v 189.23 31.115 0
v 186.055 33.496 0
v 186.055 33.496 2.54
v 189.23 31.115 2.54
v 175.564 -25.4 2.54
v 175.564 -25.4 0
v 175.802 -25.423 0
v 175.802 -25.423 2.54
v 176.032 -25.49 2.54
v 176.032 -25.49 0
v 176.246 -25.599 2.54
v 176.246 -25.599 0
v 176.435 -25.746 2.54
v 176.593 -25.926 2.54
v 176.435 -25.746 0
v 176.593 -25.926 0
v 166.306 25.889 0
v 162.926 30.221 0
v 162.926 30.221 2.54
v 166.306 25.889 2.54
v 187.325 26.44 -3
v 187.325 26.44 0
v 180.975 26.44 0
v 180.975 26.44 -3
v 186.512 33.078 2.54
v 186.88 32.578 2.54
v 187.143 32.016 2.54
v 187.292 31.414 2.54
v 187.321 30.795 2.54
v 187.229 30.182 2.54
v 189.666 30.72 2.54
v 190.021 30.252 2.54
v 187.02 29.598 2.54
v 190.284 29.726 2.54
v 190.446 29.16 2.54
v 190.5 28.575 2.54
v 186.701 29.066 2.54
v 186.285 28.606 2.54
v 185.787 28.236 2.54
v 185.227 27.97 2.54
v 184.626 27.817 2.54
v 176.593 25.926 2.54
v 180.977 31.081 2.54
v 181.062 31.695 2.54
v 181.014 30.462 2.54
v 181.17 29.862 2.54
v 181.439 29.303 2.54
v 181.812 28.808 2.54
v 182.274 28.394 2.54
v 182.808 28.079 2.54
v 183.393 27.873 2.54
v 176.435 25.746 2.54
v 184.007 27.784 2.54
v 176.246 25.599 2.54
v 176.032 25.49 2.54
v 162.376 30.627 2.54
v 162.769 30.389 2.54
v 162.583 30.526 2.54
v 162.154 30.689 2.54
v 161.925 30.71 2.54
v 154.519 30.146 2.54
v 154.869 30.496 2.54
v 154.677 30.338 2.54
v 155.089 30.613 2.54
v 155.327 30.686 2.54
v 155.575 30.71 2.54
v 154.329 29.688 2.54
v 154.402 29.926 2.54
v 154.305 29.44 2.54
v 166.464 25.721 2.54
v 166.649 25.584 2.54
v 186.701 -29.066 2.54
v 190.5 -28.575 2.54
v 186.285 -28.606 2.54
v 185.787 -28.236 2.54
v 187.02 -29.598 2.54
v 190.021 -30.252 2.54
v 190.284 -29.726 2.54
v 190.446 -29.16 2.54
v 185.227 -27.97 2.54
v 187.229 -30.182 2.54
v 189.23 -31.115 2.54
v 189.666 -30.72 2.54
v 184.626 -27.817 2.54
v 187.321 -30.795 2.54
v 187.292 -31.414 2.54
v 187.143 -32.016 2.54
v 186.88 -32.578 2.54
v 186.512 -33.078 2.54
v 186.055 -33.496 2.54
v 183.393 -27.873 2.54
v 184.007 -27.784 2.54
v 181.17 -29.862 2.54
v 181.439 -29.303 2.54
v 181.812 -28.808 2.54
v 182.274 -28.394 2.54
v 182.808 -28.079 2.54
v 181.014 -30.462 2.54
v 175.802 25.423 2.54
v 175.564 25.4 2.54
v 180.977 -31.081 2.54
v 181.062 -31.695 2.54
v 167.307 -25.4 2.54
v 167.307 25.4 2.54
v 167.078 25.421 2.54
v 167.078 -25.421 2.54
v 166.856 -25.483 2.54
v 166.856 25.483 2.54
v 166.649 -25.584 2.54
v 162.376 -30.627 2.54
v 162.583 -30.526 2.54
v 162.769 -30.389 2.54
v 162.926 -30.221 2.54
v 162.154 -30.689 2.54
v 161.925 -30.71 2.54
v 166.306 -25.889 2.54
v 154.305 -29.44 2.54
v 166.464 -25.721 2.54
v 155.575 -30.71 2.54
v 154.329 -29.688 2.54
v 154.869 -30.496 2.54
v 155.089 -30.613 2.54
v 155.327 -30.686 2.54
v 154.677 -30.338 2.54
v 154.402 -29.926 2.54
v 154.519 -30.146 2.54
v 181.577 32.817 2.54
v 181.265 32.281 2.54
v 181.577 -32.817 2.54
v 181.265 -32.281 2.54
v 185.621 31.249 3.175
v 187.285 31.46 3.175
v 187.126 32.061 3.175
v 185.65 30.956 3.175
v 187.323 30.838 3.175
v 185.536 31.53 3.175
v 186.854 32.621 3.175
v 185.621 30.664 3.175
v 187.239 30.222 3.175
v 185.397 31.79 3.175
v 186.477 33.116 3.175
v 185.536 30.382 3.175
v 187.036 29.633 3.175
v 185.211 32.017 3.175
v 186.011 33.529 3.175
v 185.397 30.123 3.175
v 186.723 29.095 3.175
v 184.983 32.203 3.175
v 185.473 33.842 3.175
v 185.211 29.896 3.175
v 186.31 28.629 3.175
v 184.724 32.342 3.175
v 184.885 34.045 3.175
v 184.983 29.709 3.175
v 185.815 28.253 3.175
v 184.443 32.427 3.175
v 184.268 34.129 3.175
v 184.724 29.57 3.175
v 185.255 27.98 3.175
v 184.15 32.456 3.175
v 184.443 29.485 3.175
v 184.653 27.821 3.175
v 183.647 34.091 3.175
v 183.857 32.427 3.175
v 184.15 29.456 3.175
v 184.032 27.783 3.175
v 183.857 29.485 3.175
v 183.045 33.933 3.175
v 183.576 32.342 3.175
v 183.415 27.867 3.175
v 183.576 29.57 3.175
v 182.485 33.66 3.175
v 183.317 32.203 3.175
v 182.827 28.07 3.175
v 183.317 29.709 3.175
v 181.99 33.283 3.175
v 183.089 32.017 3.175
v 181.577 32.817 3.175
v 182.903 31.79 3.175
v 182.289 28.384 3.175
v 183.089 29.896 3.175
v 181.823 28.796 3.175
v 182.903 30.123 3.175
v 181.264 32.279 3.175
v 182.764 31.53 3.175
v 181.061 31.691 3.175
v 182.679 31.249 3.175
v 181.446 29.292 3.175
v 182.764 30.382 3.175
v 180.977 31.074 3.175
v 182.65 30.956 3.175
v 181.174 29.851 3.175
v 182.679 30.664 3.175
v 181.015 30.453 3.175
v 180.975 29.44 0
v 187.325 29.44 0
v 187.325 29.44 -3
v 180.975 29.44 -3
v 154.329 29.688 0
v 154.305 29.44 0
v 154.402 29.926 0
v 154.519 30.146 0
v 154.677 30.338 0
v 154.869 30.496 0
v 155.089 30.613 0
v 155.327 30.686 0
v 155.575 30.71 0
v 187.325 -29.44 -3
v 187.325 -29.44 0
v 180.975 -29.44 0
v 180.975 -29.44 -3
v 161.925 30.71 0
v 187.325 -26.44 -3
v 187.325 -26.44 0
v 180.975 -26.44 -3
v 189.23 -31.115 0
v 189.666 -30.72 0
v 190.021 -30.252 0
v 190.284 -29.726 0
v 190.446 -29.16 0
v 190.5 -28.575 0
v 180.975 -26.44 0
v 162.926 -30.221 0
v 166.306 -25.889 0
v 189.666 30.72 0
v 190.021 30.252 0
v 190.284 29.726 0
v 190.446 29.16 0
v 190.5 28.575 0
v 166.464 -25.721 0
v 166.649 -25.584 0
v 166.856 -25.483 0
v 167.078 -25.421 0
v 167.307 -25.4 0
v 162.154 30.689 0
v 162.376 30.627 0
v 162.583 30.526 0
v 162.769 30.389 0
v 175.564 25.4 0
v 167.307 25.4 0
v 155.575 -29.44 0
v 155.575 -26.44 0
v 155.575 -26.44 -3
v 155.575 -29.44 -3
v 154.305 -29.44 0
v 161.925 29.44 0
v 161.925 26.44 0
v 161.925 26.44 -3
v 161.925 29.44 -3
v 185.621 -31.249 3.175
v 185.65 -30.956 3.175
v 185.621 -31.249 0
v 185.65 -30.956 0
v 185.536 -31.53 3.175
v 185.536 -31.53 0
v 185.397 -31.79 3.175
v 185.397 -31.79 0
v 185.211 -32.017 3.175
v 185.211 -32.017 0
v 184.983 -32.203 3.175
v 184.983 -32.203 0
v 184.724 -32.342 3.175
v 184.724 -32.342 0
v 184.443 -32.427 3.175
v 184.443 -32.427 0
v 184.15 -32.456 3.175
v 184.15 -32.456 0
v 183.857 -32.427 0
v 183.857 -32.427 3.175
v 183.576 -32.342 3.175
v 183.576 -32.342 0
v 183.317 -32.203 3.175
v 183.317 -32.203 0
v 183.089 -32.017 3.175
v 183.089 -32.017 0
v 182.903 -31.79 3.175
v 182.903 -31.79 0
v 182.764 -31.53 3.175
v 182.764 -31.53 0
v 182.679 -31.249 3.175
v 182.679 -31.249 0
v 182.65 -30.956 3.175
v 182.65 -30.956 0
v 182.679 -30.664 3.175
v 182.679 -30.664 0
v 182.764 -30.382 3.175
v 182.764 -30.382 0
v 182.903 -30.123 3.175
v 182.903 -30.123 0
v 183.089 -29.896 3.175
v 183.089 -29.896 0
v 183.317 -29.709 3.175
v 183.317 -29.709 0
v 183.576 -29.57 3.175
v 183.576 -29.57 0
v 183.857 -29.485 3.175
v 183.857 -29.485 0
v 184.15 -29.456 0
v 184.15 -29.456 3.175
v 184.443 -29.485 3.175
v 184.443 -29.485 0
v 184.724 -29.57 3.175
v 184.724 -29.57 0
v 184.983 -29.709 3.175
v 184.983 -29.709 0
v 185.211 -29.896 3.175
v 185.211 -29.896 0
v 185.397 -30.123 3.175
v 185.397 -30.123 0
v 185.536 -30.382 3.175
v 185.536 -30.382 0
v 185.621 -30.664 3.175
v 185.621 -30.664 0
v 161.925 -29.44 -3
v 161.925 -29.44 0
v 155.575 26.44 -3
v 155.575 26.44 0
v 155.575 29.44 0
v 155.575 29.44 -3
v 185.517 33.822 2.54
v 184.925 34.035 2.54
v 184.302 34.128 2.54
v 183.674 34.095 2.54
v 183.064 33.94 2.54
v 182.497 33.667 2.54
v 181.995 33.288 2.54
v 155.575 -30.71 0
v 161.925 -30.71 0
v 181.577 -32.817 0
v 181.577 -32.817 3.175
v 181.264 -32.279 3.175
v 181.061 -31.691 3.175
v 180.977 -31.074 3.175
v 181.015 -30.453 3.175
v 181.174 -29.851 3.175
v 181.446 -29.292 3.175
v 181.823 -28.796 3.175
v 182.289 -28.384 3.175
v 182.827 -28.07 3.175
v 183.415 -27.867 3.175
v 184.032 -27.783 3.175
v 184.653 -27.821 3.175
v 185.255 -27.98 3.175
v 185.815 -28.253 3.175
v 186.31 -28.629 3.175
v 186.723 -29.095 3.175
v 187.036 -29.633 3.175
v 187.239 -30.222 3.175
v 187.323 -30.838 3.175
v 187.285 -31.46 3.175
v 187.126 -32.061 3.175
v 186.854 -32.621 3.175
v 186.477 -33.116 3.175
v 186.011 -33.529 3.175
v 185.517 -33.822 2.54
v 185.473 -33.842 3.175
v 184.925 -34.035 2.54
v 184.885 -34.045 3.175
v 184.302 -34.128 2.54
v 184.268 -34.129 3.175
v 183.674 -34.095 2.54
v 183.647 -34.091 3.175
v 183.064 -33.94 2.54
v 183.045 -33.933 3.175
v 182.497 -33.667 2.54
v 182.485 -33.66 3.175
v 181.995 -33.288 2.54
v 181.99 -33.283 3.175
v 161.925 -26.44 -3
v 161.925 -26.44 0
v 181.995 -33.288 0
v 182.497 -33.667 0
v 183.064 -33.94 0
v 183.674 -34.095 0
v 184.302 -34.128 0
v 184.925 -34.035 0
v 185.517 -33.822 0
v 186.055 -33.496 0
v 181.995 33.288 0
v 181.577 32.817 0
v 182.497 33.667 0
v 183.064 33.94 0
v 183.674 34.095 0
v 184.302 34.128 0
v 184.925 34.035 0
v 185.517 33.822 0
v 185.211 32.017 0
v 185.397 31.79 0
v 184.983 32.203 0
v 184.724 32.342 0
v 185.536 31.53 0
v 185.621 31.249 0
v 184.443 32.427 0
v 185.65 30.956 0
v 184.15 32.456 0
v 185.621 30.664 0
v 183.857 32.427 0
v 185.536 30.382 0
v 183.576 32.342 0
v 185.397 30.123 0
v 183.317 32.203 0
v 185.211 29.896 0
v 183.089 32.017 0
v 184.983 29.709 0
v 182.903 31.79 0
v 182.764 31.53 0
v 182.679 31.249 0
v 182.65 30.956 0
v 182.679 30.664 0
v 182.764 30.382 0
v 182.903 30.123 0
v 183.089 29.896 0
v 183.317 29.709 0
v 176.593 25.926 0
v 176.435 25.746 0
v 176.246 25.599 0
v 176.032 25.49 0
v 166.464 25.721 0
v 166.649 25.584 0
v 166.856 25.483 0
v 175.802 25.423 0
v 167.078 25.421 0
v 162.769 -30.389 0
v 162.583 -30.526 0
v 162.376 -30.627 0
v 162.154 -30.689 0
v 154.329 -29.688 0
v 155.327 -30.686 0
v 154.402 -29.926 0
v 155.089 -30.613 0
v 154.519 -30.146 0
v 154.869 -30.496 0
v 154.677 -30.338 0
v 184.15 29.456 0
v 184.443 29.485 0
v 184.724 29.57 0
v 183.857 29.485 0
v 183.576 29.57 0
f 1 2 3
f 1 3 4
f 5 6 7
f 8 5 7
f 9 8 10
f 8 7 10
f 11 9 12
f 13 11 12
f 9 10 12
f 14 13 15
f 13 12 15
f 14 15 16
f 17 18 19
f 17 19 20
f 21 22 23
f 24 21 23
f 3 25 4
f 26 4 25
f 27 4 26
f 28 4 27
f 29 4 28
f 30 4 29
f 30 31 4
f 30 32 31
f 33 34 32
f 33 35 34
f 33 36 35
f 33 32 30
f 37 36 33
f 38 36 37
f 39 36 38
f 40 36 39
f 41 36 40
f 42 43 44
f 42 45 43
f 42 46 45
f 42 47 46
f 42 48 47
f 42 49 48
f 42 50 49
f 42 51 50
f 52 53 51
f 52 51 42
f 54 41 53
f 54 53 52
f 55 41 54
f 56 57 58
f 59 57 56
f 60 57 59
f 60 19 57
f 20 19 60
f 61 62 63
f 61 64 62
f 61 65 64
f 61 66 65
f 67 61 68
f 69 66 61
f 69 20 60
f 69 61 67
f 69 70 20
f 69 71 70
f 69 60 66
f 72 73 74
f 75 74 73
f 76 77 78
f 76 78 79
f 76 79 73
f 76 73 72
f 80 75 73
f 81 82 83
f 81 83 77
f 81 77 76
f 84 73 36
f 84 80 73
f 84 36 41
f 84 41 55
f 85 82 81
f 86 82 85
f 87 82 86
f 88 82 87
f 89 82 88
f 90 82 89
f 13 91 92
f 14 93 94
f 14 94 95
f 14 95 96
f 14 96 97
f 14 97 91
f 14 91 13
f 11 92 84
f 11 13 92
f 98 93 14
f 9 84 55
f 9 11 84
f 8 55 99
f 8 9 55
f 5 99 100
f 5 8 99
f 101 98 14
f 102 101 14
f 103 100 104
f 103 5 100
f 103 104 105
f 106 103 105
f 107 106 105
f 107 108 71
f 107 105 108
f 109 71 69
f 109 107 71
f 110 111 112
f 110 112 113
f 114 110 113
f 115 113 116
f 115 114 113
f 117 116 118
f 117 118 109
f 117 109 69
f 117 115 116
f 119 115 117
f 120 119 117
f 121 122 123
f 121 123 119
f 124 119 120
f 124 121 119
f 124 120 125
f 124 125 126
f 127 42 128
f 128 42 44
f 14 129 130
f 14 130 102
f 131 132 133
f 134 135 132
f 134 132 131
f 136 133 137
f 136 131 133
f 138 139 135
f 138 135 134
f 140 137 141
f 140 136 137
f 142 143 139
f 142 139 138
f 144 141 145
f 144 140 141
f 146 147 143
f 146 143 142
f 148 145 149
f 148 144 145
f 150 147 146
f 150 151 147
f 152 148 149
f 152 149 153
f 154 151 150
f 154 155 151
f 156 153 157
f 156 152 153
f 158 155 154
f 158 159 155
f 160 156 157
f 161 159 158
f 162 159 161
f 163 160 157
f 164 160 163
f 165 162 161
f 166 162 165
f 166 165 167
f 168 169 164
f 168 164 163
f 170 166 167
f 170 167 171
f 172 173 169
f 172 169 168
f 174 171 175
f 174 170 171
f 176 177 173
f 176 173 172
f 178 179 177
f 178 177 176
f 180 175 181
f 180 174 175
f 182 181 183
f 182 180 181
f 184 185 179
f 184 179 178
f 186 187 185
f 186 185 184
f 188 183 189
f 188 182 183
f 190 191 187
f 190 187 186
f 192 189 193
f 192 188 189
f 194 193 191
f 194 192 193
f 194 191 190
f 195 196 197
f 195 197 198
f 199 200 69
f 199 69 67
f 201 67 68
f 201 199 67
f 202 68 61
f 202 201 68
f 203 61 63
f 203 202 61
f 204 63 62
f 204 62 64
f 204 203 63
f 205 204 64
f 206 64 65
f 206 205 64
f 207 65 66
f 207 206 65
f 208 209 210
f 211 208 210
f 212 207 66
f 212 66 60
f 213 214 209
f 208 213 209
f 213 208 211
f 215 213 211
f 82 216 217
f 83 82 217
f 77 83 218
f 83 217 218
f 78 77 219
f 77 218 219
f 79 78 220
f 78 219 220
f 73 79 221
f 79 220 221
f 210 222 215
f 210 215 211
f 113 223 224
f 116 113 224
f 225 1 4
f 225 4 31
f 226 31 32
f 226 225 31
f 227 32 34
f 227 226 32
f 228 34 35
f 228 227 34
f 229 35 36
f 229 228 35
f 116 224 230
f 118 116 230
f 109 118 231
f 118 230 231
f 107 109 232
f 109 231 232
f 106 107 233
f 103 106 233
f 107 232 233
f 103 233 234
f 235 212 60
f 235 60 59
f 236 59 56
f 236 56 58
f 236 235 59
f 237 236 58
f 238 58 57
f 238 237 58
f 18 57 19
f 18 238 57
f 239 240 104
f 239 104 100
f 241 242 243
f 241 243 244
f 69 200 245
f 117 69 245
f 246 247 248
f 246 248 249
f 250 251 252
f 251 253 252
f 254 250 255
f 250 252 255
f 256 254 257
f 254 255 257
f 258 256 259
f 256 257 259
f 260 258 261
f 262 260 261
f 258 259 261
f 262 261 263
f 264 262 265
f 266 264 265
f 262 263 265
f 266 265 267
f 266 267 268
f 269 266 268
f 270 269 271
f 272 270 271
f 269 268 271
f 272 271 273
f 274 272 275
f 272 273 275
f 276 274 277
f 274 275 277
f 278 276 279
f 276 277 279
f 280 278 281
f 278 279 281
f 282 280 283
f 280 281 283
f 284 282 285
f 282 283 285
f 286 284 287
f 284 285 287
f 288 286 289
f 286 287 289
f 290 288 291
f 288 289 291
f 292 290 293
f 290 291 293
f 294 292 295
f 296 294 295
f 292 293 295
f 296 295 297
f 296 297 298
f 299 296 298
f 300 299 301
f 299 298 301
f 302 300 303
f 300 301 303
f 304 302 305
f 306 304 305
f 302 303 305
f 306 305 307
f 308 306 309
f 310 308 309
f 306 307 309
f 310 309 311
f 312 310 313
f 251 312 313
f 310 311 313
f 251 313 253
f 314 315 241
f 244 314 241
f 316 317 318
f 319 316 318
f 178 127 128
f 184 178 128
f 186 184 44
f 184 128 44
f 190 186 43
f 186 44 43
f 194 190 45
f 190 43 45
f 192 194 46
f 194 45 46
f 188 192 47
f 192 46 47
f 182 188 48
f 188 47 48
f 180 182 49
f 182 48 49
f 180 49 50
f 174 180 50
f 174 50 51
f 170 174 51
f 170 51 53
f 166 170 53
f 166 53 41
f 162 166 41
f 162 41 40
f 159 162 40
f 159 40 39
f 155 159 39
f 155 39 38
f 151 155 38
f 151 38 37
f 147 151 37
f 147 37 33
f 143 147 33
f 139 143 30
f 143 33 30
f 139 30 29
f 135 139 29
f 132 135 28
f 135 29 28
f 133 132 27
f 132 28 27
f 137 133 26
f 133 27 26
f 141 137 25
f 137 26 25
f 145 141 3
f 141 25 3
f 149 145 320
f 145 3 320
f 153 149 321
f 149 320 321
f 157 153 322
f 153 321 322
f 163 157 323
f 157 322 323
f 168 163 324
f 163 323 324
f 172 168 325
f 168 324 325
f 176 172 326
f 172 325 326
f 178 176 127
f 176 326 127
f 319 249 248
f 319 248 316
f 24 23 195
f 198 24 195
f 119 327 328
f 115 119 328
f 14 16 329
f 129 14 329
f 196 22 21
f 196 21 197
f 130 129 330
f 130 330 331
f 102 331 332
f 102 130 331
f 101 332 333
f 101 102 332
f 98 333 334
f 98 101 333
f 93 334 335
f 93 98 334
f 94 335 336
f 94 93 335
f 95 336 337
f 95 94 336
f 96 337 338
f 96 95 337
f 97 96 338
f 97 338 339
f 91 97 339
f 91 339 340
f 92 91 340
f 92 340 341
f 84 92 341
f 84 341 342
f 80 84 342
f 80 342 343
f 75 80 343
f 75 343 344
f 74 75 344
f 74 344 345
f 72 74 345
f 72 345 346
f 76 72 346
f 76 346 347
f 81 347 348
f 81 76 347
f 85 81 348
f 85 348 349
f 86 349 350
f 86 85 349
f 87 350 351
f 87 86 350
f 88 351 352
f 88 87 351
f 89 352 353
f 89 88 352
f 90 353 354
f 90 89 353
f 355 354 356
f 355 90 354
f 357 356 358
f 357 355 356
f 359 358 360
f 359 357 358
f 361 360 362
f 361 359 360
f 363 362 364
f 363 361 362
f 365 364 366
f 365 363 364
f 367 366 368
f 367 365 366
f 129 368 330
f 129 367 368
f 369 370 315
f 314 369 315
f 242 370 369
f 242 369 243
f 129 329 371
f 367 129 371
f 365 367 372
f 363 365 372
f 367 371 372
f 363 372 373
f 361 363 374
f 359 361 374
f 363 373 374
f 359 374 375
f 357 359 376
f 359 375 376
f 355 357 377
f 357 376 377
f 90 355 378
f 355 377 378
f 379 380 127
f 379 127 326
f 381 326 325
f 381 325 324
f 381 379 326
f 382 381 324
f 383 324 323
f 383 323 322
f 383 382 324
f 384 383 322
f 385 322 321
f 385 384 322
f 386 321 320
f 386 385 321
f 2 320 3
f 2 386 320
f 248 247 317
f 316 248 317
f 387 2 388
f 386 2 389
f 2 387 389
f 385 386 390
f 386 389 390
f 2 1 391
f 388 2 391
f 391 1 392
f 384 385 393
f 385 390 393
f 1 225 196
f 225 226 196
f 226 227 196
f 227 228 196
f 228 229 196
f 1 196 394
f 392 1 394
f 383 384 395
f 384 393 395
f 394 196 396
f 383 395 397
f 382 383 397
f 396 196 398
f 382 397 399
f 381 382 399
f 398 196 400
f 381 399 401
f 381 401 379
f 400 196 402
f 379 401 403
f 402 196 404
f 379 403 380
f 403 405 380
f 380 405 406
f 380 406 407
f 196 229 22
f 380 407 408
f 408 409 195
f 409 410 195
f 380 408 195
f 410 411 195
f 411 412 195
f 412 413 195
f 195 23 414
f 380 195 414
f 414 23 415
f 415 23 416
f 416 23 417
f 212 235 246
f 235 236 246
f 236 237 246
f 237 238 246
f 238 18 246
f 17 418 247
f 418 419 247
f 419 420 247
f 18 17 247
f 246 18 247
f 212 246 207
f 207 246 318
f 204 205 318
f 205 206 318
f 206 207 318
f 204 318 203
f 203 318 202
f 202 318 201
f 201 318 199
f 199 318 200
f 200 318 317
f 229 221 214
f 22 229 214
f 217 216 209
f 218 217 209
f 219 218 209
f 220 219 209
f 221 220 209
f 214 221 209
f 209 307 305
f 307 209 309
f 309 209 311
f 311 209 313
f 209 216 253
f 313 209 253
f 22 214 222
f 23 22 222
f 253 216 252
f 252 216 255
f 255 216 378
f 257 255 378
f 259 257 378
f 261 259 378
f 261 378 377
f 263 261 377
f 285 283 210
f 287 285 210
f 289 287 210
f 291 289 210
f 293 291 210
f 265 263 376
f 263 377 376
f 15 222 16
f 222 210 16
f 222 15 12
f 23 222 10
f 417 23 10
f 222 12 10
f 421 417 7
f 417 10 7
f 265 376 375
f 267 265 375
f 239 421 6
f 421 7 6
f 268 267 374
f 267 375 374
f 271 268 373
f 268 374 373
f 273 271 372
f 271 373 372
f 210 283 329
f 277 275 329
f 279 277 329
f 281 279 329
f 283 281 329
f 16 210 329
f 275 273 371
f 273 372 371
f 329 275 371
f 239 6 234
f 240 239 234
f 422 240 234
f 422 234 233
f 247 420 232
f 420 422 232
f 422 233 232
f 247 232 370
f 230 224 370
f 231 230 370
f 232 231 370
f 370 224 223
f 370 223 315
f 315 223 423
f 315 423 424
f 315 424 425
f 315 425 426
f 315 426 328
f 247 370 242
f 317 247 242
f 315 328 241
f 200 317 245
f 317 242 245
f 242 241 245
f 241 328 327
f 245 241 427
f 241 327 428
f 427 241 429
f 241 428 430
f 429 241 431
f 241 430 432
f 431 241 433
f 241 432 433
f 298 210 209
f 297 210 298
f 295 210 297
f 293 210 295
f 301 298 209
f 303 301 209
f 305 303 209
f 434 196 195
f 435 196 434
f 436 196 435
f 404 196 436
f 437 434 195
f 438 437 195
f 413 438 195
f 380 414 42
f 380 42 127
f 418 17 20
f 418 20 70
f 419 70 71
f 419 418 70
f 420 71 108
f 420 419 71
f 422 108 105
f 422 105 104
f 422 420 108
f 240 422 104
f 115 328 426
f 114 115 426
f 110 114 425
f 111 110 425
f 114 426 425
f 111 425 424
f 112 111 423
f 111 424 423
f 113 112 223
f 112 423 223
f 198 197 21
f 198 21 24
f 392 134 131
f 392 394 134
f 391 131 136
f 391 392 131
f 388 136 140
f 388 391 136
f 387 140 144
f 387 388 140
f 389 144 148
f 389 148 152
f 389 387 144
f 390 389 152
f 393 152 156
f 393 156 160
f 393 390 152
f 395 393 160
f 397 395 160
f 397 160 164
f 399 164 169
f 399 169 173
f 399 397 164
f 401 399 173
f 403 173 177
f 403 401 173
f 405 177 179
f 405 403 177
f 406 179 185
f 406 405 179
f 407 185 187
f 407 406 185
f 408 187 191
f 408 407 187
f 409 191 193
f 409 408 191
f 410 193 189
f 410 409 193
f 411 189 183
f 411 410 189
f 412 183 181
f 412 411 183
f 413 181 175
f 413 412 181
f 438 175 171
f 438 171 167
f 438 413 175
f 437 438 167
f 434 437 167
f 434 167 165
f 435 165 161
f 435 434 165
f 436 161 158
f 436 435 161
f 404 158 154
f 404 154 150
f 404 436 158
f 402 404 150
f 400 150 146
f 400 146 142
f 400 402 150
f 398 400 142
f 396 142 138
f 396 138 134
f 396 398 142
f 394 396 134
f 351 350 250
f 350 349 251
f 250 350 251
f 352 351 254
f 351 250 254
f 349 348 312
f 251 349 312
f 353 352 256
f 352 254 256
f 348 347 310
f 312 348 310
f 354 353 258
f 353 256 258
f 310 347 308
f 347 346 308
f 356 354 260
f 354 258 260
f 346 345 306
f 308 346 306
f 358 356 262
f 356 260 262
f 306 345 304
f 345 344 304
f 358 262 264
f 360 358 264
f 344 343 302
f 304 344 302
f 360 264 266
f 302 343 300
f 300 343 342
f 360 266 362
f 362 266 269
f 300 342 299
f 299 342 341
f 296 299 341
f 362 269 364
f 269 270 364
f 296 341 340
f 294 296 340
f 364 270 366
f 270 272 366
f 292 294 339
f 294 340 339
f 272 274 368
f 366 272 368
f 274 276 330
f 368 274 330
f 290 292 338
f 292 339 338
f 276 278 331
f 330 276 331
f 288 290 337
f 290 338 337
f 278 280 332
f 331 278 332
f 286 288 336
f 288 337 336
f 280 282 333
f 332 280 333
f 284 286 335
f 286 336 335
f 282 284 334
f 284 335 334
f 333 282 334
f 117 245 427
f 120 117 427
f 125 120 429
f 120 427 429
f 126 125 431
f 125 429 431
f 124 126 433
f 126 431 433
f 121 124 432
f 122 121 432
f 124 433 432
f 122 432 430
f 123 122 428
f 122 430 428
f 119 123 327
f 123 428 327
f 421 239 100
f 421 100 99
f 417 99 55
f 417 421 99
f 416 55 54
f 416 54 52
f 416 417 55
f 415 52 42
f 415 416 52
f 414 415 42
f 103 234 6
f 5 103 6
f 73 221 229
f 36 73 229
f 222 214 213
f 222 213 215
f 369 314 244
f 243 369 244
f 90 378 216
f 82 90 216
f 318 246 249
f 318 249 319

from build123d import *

# Parameters (mm, degrees)
SKETCH2_R           = 1.5
BOSS_EXTRUDE1_DEPTH = 2.54
SKETCH3_R           = 3.175
SKETCH3_R_2         = 1.5
BOSS_EXTRUDE2_DEPTH = 0.635
SKETCH4_W           = 6.35
SKETCH4_H           = 3
BOSS_EXTRUDE3_DEPTH = 3


with BuildPart() as part:
    # Sketch2 → Boss-Extrude1 (new body)
    with BuildSketch(Plane.XY):
        with BuildLine():
            Line((186.055, 33.49625), (189.23, 31.115))
            ThreePointArc((189.23, 31.115), (190.164806331, 29.994903166), (190.5, 28.575))
            Line((190.5, 28.575), (190.5, 0))
            Line((190.5, 0), (154.305, 0))
            Line((154.305, 0), (154.305, 29.44))
            ThreePointArc((154.305, 29.44), (154.676974388, 30.338025612), (155.575, 30.71))
            Line((155.575, 30.71), (161.925, 30.71))
            ThreePointArc((161.925, 30.71), (162.482139282, 30.58126939), (162.926332297, 30.221174521))
            Line((162.926332297, 30.221174521), (166.306150062, 25.888825479))
            ThreePointArc((166.306150062, 25.888825479), (166.750343077, 25.52873061), (167.307482358, 25.4))
            Line((167.307482358, 25.4), (175.563715168, 25.4))
            ThreePointArc((175.563715168, 25.4), (176.141475824, 25.539030228), (176.592738534, 25.925680906))
            Line((176.592738534, 25.925680906), (181.577441586, 32.817047734))
            ThreePointArc((181.577441586, 32.817047734), (183.673830399, 34.095340236), (186.055, 33.49625))
        make_face()
        with Locations((184.15, 30.95625)):
            Circle(SKETCH2_R, mode=Mode.SUBTRACT)
    extrude(amount=BOSS_EXTRUDE1_DEPTH)

    # Sketch3 → Boss-Extrude2 (add)
    with BuildSketch(Plane.XY.offset(2.54)):
        with Locations(Location((184.15, 30.95625, 0), (0, 0, 144.120815799))):
            Circle(SKETCH3_R)
        with Locations((184.15, 30.95625)):
            Circle(SKETCH3_R_2, mode=Mode.SUBTRACT)
    extrude(amount=BOSS_EXTRUDE2_DEPTH)

    # Sketch4 → Boss-Extrude3 (add)
    with BuildSketch(Plane(origin=(0, 0, 0), x_dir=(-1, 0, 0), z_dir=(0, 0, -1))):
        with Locations((-184.15, 27.94)):
            Rectangle(SKETCH4_W, SKETCH4_H)
        with Locations((-158.75, 27.94)):
            Rectangle(SKETCH4_W, SKETCH4_H)
    extrude(amount=BOSS_EXTRUDE3_DEPTH)

    # Mirror1: part across plane


with BuildPart() as part_1:
    add(part.part)
    add(part.part.mirror(Plane.ZX))


solid = part_1.part
